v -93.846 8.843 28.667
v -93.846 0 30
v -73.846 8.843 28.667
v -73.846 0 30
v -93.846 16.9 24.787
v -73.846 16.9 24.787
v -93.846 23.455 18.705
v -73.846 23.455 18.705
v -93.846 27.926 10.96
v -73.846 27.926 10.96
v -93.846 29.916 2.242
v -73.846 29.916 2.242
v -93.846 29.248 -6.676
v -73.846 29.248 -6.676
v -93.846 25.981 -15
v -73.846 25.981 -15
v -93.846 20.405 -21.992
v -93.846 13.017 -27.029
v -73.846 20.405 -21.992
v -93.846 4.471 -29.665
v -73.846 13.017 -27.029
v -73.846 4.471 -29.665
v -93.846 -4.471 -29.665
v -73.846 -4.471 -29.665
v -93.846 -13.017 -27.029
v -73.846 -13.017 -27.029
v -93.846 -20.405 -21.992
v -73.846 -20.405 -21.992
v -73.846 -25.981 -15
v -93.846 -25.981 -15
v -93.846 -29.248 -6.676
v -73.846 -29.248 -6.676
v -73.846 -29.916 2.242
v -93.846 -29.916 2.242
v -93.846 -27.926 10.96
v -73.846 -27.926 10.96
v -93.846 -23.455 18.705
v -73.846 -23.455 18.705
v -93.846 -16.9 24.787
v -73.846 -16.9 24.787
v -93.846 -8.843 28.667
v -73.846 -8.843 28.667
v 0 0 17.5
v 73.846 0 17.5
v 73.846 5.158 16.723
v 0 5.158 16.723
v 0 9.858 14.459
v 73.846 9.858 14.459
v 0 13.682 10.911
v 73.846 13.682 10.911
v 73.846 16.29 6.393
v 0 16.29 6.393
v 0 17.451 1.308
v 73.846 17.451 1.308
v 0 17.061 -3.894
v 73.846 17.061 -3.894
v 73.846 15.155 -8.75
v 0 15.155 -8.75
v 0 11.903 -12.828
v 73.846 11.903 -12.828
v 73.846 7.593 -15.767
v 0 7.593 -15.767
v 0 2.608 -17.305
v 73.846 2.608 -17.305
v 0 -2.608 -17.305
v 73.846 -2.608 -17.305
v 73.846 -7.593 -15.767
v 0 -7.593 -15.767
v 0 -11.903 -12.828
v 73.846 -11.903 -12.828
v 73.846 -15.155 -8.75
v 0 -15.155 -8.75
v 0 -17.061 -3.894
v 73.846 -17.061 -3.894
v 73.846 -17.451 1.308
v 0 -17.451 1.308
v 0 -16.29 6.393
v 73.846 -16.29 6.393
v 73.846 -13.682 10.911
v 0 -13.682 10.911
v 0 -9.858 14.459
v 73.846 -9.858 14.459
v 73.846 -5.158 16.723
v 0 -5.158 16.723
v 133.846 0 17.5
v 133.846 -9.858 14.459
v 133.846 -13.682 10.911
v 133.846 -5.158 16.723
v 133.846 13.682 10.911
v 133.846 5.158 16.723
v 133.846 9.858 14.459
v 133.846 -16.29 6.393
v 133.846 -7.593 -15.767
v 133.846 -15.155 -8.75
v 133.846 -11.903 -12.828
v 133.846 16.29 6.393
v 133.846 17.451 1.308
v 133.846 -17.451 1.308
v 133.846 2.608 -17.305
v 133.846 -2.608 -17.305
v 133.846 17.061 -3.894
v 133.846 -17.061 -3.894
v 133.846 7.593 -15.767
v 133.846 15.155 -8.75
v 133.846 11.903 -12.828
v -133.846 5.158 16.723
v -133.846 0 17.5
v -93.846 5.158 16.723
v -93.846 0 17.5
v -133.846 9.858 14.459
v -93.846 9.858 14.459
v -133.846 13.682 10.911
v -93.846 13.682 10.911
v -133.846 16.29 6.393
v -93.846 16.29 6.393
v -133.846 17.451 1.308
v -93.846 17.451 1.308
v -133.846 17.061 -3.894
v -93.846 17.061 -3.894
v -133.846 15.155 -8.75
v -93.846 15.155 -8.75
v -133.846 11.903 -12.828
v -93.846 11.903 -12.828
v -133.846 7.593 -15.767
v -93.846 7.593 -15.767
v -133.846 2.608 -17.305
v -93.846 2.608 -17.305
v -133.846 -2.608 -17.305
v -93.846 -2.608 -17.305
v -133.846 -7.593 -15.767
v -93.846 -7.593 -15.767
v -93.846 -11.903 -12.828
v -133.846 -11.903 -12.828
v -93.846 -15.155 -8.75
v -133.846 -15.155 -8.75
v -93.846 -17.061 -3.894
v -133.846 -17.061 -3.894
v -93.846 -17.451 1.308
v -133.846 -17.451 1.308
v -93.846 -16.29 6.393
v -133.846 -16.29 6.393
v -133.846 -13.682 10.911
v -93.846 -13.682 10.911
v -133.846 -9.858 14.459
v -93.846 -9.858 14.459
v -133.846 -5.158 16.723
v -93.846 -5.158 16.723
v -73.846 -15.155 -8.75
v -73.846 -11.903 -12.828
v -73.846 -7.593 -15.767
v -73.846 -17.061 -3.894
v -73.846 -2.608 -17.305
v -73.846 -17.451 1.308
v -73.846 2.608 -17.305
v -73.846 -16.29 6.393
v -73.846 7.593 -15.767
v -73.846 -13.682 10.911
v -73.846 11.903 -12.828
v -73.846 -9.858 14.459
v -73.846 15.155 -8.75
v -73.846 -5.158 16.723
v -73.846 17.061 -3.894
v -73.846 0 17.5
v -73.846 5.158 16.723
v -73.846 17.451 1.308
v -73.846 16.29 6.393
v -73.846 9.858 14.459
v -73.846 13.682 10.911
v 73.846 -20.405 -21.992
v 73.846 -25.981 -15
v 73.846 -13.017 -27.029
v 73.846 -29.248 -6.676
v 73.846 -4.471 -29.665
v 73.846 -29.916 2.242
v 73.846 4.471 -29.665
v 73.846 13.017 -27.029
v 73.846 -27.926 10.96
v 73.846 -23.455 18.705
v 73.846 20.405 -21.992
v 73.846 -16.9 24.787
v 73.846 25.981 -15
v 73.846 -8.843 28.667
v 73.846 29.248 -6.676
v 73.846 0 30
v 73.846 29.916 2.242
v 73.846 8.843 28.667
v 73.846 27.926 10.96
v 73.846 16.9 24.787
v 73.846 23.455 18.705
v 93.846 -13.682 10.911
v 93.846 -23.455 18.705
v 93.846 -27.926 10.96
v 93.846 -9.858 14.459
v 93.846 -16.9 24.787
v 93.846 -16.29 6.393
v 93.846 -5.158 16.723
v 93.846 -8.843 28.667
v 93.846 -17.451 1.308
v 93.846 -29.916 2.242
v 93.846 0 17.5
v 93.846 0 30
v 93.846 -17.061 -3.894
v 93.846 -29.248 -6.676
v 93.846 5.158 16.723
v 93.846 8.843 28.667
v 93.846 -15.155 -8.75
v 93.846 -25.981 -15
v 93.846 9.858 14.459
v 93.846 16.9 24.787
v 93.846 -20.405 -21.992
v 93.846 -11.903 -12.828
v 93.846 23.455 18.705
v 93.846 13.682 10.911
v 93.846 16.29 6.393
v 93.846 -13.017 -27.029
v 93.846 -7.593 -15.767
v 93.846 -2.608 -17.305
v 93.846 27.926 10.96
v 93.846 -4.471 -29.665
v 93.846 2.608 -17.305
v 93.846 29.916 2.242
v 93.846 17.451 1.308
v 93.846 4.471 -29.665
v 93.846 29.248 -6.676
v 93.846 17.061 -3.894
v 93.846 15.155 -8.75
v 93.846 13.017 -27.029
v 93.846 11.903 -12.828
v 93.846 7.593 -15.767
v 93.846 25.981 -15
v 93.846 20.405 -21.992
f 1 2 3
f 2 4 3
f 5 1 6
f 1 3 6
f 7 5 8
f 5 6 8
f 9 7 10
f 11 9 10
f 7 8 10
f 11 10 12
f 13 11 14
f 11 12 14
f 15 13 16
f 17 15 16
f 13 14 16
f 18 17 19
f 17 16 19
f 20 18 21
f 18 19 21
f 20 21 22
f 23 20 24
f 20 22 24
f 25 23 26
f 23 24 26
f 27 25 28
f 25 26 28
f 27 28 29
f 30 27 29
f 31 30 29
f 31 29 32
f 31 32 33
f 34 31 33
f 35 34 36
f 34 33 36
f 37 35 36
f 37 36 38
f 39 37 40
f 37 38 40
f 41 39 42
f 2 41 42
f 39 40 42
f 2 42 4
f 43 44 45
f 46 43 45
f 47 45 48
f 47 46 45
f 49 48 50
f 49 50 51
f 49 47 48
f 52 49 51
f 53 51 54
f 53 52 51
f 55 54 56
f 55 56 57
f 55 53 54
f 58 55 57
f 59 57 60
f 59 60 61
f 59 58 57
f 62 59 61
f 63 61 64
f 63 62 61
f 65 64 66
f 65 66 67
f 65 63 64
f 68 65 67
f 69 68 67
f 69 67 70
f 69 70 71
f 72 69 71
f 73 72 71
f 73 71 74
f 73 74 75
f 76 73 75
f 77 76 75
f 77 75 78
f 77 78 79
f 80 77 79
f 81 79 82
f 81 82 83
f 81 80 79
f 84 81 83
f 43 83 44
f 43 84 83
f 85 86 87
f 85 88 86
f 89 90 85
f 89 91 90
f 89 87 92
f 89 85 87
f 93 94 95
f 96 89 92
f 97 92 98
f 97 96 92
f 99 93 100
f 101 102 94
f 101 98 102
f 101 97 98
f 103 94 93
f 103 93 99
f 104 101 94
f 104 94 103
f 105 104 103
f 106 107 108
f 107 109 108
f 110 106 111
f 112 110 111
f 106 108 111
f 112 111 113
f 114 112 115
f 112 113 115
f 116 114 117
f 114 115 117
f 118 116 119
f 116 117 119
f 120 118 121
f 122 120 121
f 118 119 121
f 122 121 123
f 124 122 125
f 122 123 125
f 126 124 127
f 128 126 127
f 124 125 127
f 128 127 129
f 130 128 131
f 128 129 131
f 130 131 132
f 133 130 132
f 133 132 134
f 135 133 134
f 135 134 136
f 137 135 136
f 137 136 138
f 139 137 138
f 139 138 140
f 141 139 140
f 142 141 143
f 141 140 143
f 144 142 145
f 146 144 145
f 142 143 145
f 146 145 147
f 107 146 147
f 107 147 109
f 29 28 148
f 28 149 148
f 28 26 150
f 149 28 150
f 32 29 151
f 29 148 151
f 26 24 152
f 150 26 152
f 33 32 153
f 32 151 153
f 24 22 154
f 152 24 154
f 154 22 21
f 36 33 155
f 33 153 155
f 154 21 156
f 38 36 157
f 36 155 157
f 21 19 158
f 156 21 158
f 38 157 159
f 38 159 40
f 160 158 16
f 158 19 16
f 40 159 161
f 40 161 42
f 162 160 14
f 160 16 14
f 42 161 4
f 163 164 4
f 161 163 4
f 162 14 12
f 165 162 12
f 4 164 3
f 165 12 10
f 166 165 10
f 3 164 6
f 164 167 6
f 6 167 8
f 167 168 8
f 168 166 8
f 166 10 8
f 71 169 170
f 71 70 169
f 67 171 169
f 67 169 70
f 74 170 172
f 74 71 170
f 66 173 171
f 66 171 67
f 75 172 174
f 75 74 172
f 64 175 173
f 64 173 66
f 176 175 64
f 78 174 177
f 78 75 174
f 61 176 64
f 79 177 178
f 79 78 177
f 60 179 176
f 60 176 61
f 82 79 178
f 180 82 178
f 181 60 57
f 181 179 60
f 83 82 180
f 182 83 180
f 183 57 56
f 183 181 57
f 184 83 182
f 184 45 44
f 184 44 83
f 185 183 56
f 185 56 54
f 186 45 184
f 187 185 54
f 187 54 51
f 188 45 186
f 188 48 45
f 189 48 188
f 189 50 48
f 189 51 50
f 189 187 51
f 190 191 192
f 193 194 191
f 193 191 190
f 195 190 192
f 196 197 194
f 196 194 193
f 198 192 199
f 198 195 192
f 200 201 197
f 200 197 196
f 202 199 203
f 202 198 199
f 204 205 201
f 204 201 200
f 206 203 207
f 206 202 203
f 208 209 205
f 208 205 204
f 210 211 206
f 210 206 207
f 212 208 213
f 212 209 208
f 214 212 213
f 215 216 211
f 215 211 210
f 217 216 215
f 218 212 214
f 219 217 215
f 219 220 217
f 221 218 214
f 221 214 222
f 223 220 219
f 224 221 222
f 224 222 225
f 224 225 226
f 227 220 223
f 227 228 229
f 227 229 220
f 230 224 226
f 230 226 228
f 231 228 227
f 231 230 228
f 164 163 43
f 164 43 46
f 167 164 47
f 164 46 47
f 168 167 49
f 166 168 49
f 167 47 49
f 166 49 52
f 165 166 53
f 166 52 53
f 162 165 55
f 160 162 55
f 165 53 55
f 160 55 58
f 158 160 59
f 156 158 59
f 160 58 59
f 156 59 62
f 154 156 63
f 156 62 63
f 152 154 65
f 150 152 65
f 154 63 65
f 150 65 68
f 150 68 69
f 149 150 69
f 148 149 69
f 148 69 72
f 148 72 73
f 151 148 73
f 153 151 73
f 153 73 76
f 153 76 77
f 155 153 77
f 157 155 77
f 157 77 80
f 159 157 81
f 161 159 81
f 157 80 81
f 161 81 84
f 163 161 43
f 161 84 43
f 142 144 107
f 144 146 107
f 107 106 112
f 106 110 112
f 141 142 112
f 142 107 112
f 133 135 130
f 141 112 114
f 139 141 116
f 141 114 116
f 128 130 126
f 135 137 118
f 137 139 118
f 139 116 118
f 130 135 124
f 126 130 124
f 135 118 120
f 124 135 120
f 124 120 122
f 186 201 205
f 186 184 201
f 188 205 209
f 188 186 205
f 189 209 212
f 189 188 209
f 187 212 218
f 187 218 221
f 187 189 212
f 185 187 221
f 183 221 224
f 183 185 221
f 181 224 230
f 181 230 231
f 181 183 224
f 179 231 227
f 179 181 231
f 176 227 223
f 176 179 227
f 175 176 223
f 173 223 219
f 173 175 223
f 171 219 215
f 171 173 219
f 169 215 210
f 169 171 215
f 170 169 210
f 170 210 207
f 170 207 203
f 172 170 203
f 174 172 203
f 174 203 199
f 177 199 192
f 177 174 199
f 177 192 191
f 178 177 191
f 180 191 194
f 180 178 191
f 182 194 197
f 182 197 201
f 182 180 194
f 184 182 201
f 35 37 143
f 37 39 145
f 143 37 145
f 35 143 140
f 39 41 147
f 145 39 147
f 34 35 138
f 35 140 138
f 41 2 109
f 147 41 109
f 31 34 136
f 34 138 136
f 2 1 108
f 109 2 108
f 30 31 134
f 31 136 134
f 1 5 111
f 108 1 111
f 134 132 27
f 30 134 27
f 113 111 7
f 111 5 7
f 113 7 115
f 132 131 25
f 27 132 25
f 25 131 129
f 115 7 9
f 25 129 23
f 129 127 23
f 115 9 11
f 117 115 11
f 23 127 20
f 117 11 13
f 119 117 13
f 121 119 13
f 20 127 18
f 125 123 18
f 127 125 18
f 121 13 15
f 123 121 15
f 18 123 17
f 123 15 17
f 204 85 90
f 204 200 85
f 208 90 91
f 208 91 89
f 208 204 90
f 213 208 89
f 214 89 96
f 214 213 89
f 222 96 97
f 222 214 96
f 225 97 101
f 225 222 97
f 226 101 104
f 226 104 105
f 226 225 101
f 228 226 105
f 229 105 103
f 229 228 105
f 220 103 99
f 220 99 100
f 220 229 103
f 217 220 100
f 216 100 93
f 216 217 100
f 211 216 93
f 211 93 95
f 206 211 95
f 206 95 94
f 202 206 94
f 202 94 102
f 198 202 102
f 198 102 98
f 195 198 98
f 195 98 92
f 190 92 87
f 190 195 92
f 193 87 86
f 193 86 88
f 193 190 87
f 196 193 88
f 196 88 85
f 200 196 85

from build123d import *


with BuildPart() as f1:
    # F0 (on Front) → F1 (revolve)
    with BuildSketch(Plane.XZ):
        Polygon((0, 17.5), (0, 0), (133.846119, 0), (133.846119, 17.5), (93.846119, 17.5), (93.846119, 30), (73.846136, 30), (73.846136, 17.5), align=None)
    revolve(axis=Axis((66.923059, 0, 0), (-1, 0, 0)))

    # F2: F1 across face


with BuildPart() as f1_1:
    add(f1.part)
    add(f1.part.mirror(Plane(origin=(0, 0, 0), x_dir=(0, -1, 0), z_dir=(-1, 0, 0))))


solid = f1_1.part
